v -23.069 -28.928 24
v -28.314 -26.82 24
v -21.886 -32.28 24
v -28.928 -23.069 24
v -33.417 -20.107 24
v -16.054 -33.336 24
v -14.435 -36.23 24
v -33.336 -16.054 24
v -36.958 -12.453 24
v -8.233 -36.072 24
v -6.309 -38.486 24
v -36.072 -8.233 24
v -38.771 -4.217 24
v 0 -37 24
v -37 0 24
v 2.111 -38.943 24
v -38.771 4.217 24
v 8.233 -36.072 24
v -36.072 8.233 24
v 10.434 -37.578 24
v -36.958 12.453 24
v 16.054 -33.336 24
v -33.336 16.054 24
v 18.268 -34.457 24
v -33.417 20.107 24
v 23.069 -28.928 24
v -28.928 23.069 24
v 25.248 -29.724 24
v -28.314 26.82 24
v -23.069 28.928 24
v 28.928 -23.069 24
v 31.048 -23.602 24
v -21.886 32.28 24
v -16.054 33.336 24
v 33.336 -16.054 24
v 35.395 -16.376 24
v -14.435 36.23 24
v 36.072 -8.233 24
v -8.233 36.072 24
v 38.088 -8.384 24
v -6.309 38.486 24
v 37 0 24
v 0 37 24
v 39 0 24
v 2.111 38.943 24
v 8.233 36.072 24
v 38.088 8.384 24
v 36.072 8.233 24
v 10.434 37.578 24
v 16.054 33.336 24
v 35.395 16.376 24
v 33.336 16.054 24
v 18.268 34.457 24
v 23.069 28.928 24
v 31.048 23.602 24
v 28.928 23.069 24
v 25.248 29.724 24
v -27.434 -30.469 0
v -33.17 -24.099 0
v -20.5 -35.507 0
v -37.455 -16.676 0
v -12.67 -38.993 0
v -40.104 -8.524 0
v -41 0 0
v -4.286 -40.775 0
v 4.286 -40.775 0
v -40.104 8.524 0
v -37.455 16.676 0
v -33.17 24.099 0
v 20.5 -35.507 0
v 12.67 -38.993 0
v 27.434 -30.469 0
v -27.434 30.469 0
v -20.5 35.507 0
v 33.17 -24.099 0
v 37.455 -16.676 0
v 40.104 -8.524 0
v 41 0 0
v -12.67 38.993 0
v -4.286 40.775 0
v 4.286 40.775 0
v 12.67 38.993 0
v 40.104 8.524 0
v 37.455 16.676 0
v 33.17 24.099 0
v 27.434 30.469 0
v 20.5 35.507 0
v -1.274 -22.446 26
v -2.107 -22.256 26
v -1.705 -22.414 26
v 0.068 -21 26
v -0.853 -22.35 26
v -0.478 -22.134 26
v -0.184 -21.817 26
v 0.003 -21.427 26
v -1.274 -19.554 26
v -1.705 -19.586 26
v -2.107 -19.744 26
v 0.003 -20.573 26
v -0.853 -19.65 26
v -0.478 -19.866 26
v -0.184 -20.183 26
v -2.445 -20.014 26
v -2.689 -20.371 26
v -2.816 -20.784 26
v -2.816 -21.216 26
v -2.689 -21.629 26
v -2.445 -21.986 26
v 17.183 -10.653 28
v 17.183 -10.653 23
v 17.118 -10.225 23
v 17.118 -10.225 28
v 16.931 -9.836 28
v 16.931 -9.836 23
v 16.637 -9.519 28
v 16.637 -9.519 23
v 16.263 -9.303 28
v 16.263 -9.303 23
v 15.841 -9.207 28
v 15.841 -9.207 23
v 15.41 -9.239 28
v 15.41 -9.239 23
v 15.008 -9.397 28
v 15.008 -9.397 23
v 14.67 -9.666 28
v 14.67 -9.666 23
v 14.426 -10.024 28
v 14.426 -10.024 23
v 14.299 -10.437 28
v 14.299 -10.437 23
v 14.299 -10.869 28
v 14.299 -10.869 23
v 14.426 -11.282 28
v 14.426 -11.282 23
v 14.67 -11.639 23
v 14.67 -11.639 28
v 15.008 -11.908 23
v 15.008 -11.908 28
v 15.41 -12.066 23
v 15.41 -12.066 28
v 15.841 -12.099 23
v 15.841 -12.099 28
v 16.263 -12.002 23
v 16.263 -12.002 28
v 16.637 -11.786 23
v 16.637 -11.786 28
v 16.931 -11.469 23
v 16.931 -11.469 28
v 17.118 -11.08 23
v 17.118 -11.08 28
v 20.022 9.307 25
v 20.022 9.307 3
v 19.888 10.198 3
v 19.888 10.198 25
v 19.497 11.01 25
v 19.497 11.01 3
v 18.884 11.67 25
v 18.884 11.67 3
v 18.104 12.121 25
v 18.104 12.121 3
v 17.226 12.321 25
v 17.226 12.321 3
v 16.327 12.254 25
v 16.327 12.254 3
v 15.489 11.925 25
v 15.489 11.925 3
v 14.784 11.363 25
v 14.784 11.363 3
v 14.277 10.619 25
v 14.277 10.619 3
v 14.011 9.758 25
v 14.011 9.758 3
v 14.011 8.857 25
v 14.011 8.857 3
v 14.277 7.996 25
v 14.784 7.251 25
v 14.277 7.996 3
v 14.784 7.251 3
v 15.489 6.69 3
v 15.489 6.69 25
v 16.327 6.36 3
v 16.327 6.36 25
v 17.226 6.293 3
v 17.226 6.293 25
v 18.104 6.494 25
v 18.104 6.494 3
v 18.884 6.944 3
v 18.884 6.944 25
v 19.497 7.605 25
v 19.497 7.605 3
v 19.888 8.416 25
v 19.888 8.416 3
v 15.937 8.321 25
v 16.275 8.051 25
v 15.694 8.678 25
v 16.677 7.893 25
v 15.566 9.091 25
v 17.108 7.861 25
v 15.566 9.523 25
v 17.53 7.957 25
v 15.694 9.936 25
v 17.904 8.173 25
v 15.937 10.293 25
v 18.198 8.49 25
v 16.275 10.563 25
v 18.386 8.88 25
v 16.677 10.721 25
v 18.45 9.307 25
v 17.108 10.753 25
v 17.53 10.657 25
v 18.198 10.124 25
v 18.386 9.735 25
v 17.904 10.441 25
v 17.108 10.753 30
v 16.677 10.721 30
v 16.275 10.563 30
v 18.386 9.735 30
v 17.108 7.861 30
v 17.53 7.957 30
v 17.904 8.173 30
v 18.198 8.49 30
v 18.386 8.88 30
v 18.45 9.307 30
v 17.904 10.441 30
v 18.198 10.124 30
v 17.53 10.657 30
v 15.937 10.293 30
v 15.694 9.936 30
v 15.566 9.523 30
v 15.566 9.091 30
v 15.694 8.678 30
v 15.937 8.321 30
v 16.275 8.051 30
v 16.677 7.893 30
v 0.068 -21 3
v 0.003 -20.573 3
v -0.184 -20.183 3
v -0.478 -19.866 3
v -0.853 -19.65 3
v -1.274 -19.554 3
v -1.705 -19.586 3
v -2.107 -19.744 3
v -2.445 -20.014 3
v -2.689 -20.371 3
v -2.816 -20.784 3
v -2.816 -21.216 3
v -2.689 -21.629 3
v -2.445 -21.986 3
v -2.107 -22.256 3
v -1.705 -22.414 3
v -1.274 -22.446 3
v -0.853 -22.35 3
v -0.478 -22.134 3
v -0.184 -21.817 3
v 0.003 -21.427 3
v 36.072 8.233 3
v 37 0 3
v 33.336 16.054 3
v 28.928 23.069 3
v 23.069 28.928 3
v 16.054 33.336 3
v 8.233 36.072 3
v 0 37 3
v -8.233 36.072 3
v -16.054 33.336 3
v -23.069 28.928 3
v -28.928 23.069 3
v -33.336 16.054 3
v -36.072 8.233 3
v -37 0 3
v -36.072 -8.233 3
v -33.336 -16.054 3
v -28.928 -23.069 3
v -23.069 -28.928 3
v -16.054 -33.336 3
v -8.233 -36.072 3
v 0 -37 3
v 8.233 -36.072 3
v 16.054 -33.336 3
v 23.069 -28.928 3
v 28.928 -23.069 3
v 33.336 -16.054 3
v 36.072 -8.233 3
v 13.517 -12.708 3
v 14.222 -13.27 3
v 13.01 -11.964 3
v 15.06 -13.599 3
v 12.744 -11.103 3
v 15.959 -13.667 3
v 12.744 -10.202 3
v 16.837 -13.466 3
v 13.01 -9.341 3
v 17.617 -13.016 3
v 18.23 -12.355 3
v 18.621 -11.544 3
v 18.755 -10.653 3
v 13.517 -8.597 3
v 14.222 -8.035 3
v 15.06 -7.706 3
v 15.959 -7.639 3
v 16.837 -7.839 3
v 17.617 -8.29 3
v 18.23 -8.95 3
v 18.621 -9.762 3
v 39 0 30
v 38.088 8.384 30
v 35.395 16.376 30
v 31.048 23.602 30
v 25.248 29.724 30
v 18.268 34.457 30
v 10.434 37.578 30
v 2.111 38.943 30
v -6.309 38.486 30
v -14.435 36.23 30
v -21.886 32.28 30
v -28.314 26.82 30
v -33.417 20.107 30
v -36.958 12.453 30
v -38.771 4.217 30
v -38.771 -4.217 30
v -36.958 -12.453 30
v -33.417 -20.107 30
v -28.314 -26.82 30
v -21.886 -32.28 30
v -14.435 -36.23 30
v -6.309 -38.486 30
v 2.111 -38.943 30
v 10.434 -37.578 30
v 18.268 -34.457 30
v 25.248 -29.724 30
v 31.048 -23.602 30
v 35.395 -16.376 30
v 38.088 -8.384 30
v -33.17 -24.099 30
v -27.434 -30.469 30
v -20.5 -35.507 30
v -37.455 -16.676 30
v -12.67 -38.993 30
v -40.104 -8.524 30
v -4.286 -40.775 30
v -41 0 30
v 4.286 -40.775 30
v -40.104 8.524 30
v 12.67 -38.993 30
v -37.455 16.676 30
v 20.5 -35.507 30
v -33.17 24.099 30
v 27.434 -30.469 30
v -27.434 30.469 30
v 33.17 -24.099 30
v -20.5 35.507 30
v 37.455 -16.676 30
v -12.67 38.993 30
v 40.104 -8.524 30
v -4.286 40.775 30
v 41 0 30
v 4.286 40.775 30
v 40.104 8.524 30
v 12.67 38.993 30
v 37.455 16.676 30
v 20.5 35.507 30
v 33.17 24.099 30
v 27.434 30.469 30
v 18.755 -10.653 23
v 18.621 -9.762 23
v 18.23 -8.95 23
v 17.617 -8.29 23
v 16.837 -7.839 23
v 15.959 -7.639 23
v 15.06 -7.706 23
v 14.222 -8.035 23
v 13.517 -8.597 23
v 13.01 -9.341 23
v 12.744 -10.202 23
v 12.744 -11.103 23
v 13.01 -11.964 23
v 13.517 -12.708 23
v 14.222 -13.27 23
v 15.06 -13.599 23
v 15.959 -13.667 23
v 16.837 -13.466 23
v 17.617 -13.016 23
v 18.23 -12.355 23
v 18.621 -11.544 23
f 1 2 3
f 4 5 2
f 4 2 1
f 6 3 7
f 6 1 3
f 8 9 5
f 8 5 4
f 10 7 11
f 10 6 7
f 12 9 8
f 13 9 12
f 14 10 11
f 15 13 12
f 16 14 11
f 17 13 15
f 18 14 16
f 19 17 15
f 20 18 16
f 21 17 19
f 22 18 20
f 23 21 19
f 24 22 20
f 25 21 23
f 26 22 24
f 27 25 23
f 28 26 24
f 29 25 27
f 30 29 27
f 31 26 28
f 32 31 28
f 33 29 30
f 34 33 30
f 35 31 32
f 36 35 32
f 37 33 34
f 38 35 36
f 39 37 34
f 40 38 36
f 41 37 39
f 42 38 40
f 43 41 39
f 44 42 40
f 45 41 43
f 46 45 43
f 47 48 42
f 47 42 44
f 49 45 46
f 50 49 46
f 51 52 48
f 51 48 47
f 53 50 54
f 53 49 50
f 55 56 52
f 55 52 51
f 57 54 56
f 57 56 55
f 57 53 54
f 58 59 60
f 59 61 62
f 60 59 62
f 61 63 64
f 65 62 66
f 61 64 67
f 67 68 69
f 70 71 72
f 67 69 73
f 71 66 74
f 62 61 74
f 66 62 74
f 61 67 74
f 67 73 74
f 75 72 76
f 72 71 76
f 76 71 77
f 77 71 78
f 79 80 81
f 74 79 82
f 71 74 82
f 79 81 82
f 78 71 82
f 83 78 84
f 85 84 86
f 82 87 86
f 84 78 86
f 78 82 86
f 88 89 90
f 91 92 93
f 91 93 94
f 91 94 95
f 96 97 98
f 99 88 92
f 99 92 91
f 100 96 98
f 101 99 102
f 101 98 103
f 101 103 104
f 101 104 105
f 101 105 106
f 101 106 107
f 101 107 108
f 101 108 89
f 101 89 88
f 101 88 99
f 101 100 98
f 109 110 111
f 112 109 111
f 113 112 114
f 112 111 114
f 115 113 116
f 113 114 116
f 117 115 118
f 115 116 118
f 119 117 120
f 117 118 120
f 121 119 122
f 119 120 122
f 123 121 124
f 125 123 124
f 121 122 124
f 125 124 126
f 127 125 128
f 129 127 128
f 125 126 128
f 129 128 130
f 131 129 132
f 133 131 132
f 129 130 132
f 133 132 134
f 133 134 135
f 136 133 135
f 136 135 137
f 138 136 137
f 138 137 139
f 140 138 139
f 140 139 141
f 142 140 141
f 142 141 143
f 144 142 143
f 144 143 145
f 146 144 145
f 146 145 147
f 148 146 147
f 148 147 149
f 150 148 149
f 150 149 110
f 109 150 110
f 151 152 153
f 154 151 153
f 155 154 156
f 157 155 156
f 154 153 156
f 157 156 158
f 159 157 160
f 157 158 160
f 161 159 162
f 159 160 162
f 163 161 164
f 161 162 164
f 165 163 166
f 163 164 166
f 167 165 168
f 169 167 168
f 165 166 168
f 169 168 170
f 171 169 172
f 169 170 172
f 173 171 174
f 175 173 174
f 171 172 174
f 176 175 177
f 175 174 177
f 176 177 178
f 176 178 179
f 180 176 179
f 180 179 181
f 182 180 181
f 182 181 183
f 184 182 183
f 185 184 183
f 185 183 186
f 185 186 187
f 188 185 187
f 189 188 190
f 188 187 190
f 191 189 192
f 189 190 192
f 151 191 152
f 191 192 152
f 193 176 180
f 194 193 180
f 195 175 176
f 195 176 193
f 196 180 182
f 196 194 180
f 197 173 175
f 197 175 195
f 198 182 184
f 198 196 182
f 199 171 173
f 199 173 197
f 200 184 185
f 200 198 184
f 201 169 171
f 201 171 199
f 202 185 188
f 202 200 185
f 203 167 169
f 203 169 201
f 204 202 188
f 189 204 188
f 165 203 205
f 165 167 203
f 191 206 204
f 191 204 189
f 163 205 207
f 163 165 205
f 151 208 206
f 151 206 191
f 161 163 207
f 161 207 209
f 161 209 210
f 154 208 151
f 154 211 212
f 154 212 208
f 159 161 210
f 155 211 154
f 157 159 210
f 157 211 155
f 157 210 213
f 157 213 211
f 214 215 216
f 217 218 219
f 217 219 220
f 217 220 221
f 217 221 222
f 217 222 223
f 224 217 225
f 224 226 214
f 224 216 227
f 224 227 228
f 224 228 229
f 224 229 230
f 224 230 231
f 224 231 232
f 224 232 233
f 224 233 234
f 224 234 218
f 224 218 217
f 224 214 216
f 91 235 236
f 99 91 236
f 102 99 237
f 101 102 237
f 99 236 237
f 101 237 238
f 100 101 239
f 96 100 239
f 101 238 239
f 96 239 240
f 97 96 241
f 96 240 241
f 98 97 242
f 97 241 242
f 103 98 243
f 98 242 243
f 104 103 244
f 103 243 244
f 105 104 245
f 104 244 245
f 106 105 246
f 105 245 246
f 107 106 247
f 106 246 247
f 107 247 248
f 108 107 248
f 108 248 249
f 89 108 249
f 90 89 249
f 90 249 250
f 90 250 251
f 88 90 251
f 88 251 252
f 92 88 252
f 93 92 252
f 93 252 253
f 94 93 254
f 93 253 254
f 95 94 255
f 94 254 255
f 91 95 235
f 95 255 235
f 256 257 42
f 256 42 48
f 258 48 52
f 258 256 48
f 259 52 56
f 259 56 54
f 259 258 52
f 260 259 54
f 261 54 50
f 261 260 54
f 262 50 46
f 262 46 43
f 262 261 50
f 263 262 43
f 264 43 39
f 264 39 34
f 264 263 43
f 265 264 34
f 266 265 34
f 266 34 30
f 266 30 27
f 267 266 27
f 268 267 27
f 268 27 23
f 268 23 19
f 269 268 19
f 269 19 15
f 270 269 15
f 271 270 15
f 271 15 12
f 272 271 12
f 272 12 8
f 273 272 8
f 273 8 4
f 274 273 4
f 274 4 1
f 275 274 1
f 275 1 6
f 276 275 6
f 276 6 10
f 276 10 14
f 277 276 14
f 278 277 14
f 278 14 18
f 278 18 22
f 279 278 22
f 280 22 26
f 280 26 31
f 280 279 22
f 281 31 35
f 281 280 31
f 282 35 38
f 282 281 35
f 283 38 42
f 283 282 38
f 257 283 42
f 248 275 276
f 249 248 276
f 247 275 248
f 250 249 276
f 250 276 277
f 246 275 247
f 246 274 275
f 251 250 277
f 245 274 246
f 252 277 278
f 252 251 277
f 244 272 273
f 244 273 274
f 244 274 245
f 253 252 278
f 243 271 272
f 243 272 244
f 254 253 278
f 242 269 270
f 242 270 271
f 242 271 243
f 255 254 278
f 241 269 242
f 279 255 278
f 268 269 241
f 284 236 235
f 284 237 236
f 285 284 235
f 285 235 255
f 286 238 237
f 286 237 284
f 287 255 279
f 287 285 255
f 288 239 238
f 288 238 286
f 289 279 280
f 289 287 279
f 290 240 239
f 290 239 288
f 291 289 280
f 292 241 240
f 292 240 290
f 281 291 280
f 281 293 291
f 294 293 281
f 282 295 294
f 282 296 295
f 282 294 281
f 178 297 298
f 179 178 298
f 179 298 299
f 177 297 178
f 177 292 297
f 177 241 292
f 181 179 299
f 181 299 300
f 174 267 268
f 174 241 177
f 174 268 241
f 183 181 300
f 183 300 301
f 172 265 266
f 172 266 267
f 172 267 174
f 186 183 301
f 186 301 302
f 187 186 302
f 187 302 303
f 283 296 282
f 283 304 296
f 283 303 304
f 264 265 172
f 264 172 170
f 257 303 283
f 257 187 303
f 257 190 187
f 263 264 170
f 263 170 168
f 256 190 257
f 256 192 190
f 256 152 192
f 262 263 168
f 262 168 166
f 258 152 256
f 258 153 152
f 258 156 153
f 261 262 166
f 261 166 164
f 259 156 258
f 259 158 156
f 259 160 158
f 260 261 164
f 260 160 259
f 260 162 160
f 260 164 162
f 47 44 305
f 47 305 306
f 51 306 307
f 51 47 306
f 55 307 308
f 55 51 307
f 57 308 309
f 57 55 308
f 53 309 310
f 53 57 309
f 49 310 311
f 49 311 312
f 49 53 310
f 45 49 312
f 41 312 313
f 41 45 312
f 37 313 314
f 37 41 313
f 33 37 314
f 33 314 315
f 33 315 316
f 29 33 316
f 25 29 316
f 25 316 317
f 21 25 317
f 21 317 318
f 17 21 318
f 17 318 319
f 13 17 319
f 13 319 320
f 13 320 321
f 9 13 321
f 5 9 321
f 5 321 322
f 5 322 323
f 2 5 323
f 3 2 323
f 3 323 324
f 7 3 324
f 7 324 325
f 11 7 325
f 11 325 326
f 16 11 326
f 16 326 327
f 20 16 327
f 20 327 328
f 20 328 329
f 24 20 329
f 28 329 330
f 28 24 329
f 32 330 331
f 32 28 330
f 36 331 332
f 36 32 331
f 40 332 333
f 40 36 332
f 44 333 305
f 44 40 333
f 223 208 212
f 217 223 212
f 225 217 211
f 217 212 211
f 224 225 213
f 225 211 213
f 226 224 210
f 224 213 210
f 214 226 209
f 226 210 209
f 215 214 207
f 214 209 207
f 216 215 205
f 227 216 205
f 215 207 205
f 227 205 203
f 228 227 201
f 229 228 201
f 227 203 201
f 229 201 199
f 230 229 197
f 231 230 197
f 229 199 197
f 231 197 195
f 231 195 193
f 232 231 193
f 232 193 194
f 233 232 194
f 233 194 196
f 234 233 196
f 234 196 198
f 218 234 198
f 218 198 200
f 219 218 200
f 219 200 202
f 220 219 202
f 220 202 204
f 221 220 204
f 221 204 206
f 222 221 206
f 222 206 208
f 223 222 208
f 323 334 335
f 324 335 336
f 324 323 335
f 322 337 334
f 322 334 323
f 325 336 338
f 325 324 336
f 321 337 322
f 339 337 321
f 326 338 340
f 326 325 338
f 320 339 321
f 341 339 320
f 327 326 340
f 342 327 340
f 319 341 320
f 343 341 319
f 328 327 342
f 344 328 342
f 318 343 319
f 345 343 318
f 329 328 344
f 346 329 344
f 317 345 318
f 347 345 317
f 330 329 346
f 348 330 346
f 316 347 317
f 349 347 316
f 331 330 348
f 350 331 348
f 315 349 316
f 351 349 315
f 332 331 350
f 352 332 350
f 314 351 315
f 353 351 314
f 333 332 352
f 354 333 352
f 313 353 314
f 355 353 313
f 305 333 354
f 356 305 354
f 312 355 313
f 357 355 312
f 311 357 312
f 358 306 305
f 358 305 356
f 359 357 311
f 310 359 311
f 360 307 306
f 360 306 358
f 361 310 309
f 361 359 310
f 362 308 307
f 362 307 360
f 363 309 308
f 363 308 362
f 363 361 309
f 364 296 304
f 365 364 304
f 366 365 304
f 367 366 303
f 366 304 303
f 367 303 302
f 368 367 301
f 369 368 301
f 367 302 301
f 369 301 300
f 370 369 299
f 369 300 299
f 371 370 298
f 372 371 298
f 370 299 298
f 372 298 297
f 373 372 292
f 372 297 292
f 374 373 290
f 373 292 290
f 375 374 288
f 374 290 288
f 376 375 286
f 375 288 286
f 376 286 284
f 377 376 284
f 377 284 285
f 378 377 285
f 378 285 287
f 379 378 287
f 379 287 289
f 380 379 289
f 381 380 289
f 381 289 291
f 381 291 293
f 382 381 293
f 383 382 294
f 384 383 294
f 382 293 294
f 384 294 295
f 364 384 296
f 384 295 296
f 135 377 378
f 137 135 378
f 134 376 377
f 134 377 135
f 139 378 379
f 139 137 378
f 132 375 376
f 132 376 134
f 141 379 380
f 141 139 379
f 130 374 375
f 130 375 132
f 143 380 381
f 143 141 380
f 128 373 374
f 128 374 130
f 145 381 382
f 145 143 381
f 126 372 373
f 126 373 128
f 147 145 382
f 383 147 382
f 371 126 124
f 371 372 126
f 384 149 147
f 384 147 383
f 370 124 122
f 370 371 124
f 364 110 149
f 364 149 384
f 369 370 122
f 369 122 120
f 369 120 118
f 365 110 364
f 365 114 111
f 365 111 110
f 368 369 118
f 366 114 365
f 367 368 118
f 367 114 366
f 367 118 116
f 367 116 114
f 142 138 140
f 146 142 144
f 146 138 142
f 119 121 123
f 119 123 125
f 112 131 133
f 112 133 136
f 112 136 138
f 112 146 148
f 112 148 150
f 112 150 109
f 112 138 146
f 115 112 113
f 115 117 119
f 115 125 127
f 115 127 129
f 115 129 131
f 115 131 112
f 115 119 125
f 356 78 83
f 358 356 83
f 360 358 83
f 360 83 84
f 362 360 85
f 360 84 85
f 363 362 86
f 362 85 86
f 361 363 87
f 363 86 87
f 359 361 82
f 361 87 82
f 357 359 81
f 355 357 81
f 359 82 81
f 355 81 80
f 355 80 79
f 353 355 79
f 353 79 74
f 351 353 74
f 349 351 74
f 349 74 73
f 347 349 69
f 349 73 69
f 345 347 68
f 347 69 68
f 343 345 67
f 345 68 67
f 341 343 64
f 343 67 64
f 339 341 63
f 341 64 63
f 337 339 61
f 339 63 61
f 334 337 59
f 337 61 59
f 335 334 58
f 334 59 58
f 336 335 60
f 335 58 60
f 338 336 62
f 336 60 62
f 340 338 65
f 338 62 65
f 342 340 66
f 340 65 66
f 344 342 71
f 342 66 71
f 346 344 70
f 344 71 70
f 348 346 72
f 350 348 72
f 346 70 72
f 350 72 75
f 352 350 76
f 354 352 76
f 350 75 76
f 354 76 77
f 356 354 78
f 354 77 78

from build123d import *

# Parameters (mm, degrees)
SKETCH_1_R      = 41
SKETCH_1_R_2    = 39
EXTRUDE_1_DEPTH = 30
SKETCH_2_R      = 39
SKETCH_2_R_2    = 37
EXTRUDE_2_DEPTH = 24
SKETCH_3D_1_R   = 39
EXTRUDE_3_DEPTH = 3
SKETCH_5_R      = 1.45
EXTRUDE_4_DEPTH = 23
SKETCH_6_R      = 1.45
EXTRUDE_5_DEPTH = 25
SKETCH_7_R      = 3.022472912
EXTRUDE_6_DEPTH = 20
SKETCH_8_R      = 1.45
EXTRUDE_7_DEPTH = 27
SKETCH_9_R      = 3.022472912
EXTRUDE_8_DEPTH = 22


with BuildPart() as part:
    # 草图1 → 凸台-拉伸1 (new body)
    with BuildSketch(Plane.XY):
        Circle(SKETCH_1_R)
        Circle(SKETCH_1_R_2, mode=Mode.SUBTRACT)
    extrude(amount=EXTRUDE_1_DEPTH)

    # 草图2 → 凸台-拉伸2 (add)
    with BuildSketch(Plane.XY):
        Circle(SKETCH_2_R)
        Circle(SKETCH_2_R_2, mode=Mode.SUBTRACT)
    extrude(amount=EXTRUDE_2_DEPTH)

    # Sketch 3D_1 → 凸台-拉伸3 (add)
    with BuildSketch(Plane(origin=(0, 0, 0), x_dir=(-1, 0, 0), z_dir=(0, 0, -1))):
        Circle(SKETCH_3D_1_R)
    extrude(amount=-EXTRUDE_3_DEPTH)

    # 草图5 → 凸台-拉伸4 (add)
    with BuildSketch(Plane.XY.offset(3)):
        with Locations((-1.382493562, -21)):
            Circle(SKETCH_5_R)
    extrude(amount=EXTRUDE_4_DEPTH)

    # 草图6 → 凸台-拉伸5 (add)
    with BuildSketch(Plane.XY.offset(3)):
        with Locations((15.732786494, -10.652672394)):
            Circle(SKETCH_6_R)
    extrude(amount=EXTRUDE_5_DEPTH)

    # 草图7 → 凸台-拉伸6 (add)
    with BuildSketch(Plane.XY.offset(3)):
        with Locations((15.732786494, -10.652672394)):
            Circle(SKETCH_7_R)
    extrude(amount=EXTRUDE_6_DEPTH)

    # 草图8 → 凸台-拉伸7 (add)
    with BuildSketch(Plane.XY.offset(3)):
        with Locations((17, 9.307141481)):
            Circle(SKETCH_8_R)
    extrude(amount=EXTRUDE_7_DEPTH)

    # 草图9 → 凸台-拉伸8 (add)
    with BuildSketch(Plane.XY.offset(3)):
        with Locations((17, 9.307141481)):
            Circle(SKETCH_9_R)
    extrude(amount=EXTRUDE_8_DEPTH)


solid = part.part
